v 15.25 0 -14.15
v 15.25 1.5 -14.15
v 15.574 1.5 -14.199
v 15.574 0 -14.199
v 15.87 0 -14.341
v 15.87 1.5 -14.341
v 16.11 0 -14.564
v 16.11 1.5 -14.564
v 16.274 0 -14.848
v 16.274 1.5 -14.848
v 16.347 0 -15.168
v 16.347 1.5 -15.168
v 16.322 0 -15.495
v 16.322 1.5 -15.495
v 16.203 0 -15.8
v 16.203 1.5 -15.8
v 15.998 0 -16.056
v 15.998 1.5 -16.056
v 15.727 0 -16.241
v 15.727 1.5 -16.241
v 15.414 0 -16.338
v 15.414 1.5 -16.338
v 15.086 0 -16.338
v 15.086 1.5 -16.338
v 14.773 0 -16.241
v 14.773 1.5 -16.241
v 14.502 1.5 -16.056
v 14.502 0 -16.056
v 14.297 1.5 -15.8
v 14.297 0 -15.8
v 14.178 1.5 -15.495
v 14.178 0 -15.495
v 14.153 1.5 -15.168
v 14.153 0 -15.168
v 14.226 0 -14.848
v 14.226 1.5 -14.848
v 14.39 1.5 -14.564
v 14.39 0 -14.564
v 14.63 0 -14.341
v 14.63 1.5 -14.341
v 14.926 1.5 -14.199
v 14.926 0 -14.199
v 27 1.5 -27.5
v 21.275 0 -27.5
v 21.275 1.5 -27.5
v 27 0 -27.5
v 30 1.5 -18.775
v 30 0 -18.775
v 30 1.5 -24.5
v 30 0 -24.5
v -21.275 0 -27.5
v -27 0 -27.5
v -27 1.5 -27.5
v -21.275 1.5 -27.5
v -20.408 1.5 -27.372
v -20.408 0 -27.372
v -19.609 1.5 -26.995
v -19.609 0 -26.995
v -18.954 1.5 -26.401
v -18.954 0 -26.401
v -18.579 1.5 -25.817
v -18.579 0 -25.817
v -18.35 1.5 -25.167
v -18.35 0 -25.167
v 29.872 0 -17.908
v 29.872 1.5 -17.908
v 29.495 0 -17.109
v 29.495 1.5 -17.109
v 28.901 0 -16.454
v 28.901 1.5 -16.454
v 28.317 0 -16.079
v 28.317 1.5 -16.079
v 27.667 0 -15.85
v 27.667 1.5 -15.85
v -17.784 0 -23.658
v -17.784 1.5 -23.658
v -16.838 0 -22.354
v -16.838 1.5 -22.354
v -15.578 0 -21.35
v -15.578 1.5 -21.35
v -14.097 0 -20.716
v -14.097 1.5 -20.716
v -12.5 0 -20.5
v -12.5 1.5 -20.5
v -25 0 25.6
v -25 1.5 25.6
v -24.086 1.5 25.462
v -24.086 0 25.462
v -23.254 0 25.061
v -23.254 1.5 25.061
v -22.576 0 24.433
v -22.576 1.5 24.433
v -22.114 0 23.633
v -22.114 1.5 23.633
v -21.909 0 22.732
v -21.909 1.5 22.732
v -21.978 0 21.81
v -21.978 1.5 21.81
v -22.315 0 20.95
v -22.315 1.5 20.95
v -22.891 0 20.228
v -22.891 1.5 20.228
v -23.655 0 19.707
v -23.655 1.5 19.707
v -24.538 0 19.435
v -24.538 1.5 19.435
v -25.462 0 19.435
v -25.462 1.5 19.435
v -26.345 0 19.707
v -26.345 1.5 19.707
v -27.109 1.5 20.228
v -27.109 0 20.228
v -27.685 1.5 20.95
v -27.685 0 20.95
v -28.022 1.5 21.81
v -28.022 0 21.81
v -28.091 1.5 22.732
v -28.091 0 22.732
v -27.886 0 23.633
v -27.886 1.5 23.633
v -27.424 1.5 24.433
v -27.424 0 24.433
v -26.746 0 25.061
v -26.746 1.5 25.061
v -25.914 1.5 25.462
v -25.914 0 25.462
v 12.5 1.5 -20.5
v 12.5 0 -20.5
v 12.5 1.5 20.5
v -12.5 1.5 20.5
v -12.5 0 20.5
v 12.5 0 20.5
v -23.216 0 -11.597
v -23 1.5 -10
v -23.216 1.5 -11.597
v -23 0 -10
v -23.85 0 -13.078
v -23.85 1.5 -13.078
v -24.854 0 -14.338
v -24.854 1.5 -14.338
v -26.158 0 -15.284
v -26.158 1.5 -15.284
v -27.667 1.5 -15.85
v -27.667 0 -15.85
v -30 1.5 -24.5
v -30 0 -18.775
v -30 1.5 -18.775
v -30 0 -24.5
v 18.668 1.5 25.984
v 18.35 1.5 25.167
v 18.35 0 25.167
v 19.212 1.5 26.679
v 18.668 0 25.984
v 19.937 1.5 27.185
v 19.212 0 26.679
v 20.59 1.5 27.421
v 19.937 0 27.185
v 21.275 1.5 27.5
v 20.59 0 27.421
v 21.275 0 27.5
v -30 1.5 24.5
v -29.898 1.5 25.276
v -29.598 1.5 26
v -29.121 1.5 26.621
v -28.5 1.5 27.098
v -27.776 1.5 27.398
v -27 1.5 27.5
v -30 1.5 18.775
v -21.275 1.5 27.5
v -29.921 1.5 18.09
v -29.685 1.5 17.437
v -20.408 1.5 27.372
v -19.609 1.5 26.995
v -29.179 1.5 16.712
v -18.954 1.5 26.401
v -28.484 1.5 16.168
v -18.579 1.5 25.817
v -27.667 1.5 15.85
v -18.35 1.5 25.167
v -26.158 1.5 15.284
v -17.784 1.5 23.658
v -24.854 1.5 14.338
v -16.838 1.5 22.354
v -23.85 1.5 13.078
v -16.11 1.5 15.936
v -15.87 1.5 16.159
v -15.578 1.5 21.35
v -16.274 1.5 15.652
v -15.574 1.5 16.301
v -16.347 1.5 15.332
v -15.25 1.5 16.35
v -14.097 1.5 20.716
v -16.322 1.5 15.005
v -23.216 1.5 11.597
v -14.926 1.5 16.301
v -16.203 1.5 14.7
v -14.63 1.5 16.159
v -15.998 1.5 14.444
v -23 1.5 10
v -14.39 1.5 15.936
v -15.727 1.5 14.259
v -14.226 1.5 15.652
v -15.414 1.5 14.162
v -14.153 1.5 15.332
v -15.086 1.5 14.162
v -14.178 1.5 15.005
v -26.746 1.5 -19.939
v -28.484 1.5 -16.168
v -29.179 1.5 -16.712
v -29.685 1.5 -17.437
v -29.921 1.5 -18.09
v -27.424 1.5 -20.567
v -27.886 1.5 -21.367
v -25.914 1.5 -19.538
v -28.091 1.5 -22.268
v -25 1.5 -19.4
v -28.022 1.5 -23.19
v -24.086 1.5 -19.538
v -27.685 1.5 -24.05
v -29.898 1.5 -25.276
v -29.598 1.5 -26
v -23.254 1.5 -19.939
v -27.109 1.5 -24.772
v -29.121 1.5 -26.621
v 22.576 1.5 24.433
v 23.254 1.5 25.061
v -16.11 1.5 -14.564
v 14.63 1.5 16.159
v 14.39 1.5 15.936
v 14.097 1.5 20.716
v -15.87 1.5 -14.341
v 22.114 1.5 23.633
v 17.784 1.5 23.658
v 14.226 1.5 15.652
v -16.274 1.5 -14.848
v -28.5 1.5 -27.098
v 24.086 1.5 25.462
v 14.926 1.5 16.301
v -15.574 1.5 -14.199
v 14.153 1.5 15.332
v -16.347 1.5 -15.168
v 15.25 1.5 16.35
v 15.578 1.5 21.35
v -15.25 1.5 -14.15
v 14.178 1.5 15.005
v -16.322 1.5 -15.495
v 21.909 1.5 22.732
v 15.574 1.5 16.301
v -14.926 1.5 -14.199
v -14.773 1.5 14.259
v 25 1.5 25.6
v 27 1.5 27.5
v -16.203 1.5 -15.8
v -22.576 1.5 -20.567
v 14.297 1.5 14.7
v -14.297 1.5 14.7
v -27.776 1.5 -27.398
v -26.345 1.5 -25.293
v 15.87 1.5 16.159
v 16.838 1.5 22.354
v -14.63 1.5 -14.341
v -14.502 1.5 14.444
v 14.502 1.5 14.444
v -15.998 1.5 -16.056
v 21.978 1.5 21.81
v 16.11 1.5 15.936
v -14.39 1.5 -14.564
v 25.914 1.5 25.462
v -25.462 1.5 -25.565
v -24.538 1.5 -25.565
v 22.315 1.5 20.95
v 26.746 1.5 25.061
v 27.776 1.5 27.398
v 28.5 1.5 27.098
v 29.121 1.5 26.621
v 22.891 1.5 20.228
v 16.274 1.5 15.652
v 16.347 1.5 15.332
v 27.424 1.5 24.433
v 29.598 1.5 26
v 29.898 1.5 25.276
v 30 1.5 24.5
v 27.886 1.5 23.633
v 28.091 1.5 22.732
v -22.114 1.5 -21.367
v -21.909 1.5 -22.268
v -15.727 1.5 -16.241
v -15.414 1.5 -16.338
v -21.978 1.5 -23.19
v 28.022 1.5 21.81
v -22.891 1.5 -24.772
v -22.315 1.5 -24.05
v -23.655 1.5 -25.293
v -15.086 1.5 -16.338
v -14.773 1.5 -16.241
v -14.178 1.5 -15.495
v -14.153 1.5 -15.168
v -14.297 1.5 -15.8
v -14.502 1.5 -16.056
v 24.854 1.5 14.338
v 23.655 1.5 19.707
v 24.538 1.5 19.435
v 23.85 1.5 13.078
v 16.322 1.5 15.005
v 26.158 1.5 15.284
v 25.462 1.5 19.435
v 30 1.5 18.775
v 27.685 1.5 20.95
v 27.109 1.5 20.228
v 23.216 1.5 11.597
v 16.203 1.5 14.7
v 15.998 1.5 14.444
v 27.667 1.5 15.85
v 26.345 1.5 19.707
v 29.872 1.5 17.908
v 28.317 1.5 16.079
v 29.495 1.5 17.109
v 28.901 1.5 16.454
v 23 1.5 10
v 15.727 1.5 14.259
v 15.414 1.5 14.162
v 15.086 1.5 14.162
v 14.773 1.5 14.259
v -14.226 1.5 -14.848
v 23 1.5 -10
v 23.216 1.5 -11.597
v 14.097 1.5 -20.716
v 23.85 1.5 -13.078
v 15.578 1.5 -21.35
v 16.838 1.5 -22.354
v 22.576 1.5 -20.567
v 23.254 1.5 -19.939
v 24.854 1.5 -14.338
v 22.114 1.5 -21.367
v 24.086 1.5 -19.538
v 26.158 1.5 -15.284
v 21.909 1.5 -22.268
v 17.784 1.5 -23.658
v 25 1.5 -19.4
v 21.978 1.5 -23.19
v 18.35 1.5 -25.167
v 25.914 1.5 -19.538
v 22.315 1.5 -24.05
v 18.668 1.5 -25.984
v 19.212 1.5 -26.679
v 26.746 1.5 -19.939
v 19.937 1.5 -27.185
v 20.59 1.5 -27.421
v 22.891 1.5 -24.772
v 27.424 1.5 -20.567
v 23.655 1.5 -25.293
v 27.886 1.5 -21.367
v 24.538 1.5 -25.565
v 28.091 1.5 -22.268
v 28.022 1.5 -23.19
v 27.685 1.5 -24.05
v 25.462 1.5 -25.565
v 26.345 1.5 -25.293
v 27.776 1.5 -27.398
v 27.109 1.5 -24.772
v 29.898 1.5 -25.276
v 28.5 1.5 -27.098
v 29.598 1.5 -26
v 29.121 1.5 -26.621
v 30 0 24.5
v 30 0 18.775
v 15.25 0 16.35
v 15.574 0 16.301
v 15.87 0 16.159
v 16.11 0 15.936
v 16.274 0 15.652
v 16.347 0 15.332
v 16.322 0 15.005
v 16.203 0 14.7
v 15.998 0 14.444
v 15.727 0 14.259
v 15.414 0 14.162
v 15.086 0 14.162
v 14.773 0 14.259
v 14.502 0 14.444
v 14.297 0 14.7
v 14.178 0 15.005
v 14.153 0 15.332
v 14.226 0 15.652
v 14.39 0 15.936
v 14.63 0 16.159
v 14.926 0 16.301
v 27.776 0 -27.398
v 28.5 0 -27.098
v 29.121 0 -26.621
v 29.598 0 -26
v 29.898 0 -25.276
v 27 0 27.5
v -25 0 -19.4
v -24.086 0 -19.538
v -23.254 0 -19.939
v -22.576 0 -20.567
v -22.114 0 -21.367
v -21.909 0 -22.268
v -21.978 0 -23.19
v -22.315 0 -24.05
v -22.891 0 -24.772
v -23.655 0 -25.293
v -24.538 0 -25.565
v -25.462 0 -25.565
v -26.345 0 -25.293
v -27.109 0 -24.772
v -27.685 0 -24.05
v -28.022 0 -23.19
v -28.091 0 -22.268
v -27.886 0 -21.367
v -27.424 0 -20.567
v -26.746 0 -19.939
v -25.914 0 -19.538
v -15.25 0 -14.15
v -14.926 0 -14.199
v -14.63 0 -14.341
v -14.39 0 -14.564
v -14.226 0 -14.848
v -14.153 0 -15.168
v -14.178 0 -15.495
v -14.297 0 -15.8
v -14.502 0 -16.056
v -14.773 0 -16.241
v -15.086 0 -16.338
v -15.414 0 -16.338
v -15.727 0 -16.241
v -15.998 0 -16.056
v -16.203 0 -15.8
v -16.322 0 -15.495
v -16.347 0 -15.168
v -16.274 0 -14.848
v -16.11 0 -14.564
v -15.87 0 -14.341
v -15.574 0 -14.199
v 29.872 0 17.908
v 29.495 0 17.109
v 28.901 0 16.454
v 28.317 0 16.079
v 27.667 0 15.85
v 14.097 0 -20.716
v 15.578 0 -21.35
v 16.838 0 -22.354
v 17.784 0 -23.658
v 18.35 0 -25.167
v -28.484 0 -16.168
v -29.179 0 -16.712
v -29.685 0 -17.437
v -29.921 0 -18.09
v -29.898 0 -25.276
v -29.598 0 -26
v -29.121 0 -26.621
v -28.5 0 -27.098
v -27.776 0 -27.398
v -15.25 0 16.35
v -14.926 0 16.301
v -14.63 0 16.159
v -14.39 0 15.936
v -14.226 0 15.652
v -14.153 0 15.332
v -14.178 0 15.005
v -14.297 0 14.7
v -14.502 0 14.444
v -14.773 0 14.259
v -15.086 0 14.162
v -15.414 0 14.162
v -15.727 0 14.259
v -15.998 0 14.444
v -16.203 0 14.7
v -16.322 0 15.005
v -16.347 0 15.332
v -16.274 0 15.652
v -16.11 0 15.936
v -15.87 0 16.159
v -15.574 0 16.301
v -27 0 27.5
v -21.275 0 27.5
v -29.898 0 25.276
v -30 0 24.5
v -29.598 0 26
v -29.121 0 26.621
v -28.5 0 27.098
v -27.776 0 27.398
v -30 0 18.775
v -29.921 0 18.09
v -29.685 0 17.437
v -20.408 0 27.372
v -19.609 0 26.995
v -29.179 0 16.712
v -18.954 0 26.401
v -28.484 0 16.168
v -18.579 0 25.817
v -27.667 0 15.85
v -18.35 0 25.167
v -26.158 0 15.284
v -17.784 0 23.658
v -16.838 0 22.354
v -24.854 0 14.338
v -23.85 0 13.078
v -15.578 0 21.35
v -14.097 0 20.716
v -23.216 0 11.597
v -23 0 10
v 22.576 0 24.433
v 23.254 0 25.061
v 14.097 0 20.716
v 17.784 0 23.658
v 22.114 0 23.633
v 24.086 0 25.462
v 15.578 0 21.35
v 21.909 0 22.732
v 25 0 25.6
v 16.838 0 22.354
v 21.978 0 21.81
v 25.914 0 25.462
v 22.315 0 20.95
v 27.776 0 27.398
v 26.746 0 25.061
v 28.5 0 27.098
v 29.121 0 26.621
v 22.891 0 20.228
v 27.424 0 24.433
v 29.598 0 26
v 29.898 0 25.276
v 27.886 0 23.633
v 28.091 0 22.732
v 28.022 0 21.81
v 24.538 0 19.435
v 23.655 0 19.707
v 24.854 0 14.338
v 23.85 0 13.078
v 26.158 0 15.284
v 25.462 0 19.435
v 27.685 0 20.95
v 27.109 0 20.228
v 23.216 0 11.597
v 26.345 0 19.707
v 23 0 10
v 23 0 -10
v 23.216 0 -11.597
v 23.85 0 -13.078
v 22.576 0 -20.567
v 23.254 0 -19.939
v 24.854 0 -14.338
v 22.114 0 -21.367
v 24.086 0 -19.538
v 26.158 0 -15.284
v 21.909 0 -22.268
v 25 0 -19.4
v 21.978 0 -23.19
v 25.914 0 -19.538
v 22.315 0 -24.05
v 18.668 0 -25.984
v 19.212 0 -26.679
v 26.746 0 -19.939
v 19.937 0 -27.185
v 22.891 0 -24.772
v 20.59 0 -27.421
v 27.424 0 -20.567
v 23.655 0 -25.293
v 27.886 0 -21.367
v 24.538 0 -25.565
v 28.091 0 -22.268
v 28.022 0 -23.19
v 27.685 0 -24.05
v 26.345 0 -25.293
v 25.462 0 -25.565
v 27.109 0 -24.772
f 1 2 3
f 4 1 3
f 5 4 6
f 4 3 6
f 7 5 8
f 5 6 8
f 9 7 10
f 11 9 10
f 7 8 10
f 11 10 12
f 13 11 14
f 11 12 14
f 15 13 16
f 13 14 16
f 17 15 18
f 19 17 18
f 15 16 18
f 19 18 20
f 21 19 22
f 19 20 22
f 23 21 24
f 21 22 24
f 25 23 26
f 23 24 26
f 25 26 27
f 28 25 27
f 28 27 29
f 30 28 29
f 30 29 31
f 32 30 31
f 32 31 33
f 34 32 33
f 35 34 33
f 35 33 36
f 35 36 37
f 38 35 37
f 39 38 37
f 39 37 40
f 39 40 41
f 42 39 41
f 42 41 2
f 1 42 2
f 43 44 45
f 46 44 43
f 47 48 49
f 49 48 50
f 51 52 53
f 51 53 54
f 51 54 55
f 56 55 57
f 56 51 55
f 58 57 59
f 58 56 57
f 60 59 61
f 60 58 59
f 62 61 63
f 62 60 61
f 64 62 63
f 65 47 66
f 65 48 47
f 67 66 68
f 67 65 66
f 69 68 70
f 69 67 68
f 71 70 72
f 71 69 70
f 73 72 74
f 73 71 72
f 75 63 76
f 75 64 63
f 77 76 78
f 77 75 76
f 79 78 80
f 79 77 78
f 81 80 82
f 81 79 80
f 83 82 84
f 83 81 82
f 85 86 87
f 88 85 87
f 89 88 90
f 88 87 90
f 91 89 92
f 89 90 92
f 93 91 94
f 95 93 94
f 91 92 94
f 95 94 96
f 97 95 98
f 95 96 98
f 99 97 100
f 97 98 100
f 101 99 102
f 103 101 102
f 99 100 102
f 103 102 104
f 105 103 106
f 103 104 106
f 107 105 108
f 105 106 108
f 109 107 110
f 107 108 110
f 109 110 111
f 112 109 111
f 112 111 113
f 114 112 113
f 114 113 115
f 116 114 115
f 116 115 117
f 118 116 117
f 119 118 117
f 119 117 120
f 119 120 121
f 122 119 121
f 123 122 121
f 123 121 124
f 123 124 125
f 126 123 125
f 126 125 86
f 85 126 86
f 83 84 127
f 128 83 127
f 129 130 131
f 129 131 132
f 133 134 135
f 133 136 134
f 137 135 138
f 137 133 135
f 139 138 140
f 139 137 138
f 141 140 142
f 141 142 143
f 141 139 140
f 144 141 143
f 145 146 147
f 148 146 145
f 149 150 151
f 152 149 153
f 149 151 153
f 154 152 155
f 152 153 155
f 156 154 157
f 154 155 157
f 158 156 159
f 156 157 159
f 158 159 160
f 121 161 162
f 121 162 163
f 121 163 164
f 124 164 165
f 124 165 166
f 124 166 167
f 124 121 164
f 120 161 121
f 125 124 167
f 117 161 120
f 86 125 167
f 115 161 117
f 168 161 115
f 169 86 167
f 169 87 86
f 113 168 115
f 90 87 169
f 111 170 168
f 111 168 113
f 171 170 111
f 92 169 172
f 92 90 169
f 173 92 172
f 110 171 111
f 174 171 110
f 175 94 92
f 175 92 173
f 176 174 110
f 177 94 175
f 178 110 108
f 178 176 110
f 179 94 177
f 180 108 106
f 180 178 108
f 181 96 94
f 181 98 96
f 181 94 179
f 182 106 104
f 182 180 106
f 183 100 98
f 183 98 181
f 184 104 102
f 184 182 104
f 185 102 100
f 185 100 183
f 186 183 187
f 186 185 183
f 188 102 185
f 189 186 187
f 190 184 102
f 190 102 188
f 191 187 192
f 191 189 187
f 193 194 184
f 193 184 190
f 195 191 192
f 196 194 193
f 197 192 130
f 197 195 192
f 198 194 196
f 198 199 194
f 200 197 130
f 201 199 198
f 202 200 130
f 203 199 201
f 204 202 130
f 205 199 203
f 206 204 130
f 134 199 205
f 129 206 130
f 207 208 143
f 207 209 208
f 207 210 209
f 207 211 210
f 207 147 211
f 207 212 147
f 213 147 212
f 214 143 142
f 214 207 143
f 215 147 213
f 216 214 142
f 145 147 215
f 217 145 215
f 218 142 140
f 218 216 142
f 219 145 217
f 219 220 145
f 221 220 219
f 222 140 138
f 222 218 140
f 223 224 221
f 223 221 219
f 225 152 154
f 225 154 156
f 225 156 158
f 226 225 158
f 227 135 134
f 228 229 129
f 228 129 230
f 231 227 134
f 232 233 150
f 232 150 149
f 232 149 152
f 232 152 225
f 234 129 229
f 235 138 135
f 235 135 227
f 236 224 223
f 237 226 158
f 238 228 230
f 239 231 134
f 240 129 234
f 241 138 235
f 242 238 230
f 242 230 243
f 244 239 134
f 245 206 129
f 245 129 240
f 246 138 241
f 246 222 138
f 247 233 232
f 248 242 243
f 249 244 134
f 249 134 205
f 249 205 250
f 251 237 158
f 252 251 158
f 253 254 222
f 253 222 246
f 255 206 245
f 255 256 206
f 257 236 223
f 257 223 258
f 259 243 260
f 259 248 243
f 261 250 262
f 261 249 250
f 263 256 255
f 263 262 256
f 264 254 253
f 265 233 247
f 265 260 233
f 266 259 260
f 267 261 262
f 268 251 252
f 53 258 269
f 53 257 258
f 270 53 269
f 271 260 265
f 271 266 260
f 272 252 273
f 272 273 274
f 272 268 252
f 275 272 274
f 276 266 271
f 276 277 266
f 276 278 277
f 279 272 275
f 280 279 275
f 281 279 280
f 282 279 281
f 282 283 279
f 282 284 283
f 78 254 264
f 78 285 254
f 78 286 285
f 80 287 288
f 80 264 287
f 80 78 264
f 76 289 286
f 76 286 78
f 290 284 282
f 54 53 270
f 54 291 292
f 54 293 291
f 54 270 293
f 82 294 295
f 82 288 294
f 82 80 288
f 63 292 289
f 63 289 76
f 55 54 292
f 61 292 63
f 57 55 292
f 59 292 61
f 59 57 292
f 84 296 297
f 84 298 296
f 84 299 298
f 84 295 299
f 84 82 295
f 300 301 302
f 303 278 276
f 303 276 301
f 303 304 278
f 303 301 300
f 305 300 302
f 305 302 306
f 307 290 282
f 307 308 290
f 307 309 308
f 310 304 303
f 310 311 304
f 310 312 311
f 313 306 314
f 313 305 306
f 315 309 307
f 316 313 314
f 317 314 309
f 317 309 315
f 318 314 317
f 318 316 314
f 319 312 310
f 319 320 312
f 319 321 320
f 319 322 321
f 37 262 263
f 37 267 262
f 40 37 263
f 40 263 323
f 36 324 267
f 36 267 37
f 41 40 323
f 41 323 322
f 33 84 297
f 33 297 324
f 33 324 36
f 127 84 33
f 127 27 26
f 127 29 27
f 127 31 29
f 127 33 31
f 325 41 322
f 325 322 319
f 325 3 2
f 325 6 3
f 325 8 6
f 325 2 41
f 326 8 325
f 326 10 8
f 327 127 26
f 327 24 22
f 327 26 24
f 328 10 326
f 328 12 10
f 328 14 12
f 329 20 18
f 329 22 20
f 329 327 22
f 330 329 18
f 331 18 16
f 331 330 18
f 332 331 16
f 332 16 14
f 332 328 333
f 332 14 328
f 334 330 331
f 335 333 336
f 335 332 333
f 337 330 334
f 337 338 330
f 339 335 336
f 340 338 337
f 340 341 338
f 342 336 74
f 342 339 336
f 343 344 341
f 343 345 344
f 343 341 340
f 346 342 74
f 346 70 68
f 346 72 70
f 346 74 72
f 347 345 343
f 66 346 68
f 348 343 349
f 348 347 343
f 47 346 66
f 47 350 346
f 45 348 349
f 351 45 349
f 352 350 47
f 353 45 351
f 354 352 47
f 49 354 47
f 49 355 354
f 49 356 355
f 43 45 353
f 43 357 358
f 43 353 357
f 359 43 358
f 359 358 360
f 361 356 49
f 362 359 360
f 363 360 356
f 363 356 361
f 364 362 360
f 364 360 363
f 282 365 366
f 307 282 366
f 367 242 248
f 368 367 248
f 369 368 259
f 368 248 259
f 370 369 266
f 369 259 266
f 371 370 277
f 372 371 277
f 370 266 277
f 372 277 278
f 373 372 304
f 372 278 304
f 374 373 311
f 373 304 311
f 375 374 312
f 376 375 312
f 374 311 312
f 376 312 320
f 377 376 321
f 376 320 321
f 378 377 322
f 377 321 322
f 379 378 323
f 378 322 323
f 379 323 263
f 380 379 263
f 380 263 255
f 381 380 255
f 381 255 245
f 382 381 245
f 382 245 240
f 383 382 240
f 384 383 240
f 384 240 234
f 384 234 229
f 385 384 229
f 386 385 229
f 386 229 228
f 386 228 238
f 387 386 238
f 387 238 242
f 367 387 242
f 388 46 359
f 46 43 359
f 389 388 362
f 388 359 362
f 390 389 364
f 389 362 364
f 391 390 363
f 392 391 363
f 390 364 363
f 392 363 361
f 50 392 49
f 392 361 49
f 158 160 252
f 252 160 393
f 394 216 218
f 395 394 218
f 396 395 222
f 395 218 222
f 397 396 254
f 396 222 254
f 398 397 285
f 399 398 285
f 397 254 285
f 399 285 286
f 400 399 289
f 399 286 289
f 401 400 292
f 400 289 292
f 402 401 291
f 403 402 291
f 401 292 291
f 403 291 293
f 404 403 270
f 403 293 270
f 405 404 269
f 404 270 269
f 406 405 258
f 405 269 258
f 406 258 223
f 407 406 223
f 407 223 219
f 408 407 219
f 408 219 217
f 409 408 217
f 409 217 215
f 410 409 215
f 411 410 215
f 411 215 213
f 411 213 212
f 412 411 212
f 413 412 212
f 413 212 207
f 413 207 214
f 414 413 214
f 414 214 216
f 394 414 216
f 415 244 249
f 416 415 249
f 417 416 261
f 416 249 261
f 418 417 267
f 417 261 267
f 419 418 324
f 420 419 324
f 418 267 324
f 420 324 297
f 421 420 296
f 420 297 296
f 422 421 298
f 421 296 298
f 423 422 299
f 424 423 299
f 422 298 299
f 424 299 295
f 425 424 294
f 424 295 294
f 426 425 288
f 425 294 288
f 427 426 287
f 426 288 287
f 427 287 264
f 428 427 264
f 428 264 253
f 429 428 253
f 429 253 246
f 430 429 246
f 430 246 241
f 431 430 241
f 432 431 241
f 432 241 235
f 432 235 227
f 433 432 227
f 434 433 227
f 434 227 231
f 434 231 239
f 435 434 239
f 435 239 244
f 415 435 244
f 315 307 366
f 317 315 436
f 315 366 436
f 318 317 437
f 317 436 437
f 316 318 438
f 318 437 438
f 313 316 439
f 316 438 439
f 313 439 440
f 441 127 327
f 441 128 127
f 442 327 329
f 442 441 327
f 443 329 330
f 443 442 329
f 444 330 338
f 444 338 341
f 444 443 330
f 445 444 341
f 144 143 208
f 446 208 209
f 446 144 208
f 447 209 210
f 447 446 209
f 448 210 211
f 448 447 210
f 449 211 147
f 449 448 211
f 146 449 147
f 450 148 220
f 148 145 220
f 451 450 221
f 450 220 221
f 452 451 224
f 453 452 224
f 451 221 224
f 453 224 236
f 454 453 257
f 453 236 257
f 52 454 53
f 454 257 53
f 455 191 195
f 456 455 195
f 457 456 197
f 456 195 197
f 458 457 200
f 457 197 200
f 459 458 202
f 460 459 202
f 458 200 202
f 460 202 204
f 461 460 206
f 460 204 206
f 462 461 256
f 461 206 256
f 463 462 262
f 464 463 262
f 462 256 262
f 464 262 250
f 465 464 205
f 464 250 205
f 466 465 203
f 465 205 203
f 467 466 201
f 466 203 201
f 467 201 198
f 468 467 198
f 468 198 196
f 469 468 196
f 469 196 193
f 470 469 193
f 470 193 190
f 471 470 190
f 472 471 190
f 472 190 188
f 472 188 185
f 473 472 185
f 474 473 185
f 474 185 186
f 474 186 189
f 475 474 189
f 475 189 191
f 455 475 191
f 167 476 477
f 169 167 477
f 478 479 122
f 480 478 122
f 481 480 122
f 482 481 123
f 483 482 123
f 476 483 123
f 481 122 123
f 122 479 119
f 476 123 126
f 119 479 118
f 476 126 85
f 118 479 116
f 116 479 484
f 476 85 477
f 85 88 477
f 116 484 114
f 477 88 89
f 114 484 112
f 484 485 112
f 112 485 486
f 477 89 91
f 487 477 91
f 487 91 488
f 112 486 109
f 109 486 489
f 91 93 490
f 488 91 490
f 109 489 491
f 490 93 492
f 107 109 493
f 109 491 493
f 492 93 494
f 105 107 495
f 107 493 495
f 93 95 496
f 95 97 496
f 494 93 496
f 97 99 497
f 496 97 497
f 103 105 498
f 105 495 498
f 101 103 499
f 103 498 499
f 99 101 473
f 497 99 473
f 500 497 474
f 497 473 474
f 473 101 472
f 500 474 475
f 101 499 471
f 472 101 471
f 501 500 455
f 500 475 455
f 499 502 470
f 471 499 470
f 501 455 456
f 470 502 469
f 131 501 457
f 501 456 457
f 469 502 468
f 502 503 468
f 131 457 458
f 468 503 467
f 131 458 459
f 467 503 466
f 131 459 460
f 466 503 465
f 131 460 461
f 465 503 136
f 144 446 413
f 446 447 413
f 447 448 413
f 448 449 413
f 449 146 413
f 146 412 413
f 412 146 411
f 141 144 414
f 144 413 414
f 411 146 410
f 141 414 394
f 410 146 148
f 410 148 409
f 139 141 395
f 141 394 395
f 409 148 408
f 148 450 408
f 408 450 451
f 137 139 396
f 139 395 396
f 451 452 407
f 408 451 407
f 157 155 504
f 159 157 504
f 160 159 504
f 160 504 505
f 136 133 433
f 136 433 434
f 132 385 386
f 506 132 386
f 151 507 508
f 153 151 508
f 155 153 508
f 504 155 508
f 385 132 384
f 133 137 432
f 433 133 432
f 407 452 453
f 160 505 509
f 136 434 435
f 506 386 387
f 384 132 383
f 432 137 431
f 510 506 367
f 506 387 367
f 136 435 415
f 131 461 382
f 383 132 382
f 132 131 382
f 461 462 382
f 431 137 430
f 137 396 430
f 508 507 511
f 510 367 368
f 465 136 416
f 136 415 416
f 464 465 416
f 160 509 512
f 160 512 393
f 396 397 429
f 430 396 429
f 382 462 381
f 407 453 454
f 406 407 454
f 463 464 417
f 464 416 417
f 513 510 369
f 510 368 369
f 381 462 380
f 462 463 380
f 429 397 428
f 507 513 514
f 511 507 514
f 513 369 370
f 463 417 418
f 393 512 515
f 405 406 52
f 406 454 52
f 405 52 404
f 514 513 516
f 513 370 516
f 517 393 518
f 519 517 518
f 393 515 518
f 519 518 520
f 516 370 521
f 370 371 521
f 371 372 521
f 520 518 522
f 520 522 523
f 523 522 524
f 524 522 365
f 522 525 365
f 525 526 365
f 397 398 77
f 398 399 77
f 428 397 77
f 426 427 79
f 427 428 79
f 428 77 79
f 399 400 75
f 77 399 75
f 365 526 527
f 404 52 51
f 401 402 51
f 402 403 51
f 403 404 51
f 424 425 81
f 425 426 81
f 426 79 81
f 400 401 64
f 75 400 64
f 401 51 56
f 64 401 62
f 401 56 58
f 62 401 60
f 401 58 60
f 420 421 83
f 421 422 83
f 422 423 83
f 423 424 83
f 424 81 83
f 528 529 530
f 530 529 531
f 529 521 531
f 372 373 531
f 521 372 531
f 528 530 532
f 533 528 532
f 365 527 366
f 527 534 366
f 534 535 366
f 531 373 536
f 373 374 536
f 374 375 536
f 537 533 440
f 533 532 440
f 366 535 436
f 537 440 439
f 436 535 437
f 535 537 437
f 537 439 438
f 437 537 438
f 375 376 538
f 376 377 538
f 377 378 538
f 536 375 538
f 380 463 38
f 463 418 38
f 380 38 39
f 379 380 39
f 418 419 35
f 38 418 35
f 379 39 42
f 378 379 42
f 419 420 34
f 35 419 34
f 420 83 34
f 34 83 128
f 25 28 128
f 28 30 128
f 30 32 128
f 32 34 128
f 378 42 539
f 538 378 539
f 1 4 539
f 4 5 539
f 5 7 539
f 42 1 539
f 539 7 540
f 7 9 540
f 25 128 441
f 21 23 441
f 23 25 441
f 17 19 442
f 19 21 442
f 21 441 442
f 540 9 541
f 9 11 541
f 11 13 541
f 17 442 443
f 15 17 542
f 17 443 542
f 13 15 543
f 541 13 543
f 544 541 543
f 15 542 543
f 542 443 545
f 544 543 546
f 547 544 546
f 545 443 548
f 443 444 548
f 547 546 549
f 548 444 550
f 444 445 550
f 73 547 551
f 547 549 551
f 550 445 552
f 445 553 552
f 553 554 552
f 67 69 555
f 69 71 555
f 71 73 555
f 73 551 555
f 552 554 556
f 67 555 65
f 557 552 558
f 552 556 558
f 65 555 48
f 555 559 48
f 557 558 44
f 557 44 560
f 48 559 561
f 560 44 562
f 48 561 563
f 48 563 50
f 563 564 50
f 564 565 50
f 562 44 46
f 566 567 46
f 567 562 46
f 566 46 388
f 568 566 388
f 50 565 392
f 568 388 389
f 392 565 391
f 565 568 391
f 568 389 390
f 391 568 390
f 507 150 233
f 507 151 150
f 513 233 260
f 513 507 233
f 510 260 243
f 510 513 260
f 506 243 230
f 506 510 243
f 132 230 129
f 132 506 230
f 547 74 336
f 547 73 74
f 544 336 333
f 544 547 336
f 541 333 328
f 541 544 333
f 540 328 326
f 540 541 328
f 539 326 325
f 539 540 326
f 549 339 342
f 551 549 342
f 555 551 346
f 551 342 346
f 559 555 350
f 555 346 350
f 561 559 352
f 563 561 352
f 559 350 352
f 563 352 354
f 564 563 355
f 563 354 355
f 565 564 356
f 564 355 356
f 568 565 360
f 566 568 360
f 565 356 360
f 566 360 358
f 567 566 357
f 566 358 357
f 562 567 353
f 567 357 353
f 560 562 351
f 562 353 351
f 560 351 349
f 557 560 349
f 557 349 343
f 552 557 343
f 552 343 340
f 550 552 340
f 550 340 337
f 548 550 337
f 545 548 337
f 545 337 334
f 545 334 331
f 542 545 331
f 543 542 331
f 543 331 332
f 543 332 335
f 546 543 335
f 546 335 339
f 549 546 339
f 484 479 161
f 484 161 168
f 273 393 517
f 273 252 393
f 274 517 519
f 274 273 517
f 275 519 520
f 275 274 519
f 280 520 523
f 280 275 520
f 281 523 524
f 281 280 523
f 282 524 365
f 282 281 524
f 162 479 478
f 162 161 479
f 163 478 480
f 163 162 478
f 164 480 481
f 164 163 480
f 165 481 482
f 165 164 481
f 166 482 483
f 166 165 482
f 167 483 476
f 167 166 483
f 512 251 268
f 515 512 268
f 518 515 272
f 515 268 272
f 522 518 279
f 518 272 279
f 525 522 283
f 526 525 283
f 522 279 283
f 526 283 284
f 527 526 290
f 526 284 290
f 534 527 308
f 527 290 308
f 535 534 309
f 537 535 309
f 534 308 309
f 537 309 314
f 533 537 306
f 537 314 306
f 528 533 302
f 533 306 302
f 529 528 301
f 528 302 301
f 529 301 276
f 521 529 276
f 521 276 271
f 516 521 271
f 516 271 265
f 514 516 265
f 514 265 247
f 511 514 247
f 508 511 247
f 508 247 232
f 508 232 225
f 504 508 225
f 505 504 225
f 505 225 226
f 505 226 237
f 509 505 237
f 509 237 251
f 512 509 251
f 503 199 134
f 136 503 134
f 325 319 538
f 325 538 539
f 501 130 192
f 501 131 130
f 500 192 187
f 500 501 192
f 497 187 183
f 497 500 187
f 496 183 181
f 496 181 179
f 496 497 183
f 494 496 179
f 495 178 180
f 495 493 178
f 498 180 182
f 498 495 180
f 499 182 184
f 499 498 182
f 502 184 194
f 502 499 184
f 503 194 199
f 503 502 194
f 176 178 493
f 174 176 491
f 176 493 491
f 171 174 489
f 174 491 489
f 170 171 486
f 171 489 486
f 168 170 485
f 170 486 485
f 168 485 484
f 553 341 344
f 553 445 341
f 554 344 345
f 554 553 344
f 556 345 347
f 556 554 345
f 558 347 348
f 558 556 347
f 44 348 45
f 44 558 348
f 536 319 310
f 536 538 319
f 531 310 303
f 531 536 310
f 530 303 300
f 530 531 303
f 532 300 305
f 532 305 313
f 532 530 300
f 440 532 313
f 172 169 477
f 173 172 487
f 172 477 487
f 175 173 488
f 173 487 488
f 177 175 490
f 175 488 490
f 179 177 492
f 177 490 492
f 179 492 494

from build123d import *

# Parameters (mm, degrees)
SKETCH1_W           = 60
SKETCH1_H           = 55
BOSS_EXTRUDE1_DEPTH = 1.5
SKETCH2_R           = 3.1
CUT_EXTRUDE1_DEPTH  = 41.724685389
FILLET1_R           = 3
SKETCH4_W           = 37
SKETCH4_H           = 7
SKETCH4_W_2         = 7
SKETCH4_H_2         = 32
CUT_EXTRUDE2_DEPTH  = 41.724685389
FILLET2_R           = 6
FILLET3_R           = 3
SKETCH5_R           = 1.1
CUT_EXTRUDE3_DEPTH  = 41.724685533


with BuildPart() as part:
    # Sketch1 → Boss-Extrude1 (new body)
    with BuildSketch(Plane(origin=(0, 0, 0), x_dir=(1, 0, 0), z_dir=(0, 1, 0))):
        Rectangle(SKETCH1_W, SKETCH1_H)
    extrude(amount=BOSS_EXTRUDE1_DEPTH)

    # Sketch2 → Cut-Extrude1 (cut, through all)
    with BuildSketch(Plane(origin=(0, 1.5, 0), x_dir=(1, 0, 0), z_dir=(0, 1, 0))):
        with Locations(Location((-25, 22.5, 0), (0, 0, 270))):
            Circle(SKETCH2_R)
        with Locations(Location((25, 22.5, 0), (0, 0, 270))):
            Circle(SKETCH2_R)
        with Locations(Location((-25, -22.5, 0), (0, 0, 270))):
            Circle(SKETCH2_R)
        with Locations(Location((25, -22.5, 0), (0, 0, 270))):
            Circle(SKETCH2_R)
    extrude(amount=-CUT_EXTRUDE1_DEPTH, mode=Mode.SUBTRACT)

    # Fillet1
    fillet1_edges = [part.edges().sort_by_distance(p)[0] for p in [
        (-30, 0.75, -27.5),
        (30, 0.75, -27.5),
        (30, 0.75, 27.5),
        (-30, 0.75, 27.5),
    ]]
    fillet(fillet1_edges, radius=FILLET1_R)

    # Sketch4 → Cut-Extrude2 (cut, through all)
    with BuildSketch(Plane(origin=(0, 1.5, 0), x_dir=(1, 0, 0), z_dir=(0, 1, 0))):
        with Locations((0, 24)):
            Rectangle(SKETCH4_W, SKETCH4_H)
        with Locations((-26.5, 0)):
            Rectangle(SKETCH4_W_2, SKETCH4_H_2)
        with Locations((0, -24)):
            Rectangle(SKETCH4_W, SKETCH4_H)
        with Locations((26.5, 0)):
            Rectangle(SKETCH4_W_2, SKETCH4_H_2)
    extrude(amount=-CUT_EXTRUDE2_DEPTH, mode=Mode.SUBTRACT)

    # Fillet2
    fillet2_edges = [part.edges().sort_by_distance(p)[0] for p in [
        (-18.5, 0.75, -20.5),
        (18.5, 0.75, -20.5),
        (-23, 0.75, -16),
        (-23, 0.75, 16),
        (-18.5, 0.75, 20.5),
        (18.5, 0.75, 20.5),
        (23, 0.75, -16),
        (23, 0.75, 16),
    ]]
    fillet(fillet2_edges, radius=FILLET2_R)

    # Fillet3
    fillet3_edges = [part.edges().sort_by_distance(p)[0] for p in [
        (30, 0.75, -16),
        (18.5, 0.75, -27.5),
        (30, 0.75, 16),
        (18.5, 0.75, 27.5),
        (-18.5, 0.75, 27.5),
        (-30, 0.75, 16),
        (-18.5, 0.75, -27.5),
        (-30, 0.75, -16),
    ]]
    fillet(fillet3_edges, radius=FILLET3_R)

    # Sketch5 → Cut-Extrude3 (cut, through all)
    with BuildSketch(Plane(origin=(0, 1.5, 0), x_dir=(1, 0, 0), z_dir=(0, 1, 0))):
        with Locations(Location((-15.25, 15.25, 0), (0, 0, 270))):
            Circle(SKETCH5_R)
        with Locations(Location((15.25, 15.25, 0), (0, 0, 270))):
            Circle(SKETCH5_R)
        with Locations(Location((-15.25, -15.25, 0), (0, 0, 270))):
            Circle(SKETCH5_R)
        with Locations(Location((15.25, -15.25, 0), (0, 0, 270))):
            Circle(SKETCH5_R)
    extrude(amount=-CUT_EXTRUDE3_DEPTH, mode=Mode.SUBTRACT)


solid = part.part
